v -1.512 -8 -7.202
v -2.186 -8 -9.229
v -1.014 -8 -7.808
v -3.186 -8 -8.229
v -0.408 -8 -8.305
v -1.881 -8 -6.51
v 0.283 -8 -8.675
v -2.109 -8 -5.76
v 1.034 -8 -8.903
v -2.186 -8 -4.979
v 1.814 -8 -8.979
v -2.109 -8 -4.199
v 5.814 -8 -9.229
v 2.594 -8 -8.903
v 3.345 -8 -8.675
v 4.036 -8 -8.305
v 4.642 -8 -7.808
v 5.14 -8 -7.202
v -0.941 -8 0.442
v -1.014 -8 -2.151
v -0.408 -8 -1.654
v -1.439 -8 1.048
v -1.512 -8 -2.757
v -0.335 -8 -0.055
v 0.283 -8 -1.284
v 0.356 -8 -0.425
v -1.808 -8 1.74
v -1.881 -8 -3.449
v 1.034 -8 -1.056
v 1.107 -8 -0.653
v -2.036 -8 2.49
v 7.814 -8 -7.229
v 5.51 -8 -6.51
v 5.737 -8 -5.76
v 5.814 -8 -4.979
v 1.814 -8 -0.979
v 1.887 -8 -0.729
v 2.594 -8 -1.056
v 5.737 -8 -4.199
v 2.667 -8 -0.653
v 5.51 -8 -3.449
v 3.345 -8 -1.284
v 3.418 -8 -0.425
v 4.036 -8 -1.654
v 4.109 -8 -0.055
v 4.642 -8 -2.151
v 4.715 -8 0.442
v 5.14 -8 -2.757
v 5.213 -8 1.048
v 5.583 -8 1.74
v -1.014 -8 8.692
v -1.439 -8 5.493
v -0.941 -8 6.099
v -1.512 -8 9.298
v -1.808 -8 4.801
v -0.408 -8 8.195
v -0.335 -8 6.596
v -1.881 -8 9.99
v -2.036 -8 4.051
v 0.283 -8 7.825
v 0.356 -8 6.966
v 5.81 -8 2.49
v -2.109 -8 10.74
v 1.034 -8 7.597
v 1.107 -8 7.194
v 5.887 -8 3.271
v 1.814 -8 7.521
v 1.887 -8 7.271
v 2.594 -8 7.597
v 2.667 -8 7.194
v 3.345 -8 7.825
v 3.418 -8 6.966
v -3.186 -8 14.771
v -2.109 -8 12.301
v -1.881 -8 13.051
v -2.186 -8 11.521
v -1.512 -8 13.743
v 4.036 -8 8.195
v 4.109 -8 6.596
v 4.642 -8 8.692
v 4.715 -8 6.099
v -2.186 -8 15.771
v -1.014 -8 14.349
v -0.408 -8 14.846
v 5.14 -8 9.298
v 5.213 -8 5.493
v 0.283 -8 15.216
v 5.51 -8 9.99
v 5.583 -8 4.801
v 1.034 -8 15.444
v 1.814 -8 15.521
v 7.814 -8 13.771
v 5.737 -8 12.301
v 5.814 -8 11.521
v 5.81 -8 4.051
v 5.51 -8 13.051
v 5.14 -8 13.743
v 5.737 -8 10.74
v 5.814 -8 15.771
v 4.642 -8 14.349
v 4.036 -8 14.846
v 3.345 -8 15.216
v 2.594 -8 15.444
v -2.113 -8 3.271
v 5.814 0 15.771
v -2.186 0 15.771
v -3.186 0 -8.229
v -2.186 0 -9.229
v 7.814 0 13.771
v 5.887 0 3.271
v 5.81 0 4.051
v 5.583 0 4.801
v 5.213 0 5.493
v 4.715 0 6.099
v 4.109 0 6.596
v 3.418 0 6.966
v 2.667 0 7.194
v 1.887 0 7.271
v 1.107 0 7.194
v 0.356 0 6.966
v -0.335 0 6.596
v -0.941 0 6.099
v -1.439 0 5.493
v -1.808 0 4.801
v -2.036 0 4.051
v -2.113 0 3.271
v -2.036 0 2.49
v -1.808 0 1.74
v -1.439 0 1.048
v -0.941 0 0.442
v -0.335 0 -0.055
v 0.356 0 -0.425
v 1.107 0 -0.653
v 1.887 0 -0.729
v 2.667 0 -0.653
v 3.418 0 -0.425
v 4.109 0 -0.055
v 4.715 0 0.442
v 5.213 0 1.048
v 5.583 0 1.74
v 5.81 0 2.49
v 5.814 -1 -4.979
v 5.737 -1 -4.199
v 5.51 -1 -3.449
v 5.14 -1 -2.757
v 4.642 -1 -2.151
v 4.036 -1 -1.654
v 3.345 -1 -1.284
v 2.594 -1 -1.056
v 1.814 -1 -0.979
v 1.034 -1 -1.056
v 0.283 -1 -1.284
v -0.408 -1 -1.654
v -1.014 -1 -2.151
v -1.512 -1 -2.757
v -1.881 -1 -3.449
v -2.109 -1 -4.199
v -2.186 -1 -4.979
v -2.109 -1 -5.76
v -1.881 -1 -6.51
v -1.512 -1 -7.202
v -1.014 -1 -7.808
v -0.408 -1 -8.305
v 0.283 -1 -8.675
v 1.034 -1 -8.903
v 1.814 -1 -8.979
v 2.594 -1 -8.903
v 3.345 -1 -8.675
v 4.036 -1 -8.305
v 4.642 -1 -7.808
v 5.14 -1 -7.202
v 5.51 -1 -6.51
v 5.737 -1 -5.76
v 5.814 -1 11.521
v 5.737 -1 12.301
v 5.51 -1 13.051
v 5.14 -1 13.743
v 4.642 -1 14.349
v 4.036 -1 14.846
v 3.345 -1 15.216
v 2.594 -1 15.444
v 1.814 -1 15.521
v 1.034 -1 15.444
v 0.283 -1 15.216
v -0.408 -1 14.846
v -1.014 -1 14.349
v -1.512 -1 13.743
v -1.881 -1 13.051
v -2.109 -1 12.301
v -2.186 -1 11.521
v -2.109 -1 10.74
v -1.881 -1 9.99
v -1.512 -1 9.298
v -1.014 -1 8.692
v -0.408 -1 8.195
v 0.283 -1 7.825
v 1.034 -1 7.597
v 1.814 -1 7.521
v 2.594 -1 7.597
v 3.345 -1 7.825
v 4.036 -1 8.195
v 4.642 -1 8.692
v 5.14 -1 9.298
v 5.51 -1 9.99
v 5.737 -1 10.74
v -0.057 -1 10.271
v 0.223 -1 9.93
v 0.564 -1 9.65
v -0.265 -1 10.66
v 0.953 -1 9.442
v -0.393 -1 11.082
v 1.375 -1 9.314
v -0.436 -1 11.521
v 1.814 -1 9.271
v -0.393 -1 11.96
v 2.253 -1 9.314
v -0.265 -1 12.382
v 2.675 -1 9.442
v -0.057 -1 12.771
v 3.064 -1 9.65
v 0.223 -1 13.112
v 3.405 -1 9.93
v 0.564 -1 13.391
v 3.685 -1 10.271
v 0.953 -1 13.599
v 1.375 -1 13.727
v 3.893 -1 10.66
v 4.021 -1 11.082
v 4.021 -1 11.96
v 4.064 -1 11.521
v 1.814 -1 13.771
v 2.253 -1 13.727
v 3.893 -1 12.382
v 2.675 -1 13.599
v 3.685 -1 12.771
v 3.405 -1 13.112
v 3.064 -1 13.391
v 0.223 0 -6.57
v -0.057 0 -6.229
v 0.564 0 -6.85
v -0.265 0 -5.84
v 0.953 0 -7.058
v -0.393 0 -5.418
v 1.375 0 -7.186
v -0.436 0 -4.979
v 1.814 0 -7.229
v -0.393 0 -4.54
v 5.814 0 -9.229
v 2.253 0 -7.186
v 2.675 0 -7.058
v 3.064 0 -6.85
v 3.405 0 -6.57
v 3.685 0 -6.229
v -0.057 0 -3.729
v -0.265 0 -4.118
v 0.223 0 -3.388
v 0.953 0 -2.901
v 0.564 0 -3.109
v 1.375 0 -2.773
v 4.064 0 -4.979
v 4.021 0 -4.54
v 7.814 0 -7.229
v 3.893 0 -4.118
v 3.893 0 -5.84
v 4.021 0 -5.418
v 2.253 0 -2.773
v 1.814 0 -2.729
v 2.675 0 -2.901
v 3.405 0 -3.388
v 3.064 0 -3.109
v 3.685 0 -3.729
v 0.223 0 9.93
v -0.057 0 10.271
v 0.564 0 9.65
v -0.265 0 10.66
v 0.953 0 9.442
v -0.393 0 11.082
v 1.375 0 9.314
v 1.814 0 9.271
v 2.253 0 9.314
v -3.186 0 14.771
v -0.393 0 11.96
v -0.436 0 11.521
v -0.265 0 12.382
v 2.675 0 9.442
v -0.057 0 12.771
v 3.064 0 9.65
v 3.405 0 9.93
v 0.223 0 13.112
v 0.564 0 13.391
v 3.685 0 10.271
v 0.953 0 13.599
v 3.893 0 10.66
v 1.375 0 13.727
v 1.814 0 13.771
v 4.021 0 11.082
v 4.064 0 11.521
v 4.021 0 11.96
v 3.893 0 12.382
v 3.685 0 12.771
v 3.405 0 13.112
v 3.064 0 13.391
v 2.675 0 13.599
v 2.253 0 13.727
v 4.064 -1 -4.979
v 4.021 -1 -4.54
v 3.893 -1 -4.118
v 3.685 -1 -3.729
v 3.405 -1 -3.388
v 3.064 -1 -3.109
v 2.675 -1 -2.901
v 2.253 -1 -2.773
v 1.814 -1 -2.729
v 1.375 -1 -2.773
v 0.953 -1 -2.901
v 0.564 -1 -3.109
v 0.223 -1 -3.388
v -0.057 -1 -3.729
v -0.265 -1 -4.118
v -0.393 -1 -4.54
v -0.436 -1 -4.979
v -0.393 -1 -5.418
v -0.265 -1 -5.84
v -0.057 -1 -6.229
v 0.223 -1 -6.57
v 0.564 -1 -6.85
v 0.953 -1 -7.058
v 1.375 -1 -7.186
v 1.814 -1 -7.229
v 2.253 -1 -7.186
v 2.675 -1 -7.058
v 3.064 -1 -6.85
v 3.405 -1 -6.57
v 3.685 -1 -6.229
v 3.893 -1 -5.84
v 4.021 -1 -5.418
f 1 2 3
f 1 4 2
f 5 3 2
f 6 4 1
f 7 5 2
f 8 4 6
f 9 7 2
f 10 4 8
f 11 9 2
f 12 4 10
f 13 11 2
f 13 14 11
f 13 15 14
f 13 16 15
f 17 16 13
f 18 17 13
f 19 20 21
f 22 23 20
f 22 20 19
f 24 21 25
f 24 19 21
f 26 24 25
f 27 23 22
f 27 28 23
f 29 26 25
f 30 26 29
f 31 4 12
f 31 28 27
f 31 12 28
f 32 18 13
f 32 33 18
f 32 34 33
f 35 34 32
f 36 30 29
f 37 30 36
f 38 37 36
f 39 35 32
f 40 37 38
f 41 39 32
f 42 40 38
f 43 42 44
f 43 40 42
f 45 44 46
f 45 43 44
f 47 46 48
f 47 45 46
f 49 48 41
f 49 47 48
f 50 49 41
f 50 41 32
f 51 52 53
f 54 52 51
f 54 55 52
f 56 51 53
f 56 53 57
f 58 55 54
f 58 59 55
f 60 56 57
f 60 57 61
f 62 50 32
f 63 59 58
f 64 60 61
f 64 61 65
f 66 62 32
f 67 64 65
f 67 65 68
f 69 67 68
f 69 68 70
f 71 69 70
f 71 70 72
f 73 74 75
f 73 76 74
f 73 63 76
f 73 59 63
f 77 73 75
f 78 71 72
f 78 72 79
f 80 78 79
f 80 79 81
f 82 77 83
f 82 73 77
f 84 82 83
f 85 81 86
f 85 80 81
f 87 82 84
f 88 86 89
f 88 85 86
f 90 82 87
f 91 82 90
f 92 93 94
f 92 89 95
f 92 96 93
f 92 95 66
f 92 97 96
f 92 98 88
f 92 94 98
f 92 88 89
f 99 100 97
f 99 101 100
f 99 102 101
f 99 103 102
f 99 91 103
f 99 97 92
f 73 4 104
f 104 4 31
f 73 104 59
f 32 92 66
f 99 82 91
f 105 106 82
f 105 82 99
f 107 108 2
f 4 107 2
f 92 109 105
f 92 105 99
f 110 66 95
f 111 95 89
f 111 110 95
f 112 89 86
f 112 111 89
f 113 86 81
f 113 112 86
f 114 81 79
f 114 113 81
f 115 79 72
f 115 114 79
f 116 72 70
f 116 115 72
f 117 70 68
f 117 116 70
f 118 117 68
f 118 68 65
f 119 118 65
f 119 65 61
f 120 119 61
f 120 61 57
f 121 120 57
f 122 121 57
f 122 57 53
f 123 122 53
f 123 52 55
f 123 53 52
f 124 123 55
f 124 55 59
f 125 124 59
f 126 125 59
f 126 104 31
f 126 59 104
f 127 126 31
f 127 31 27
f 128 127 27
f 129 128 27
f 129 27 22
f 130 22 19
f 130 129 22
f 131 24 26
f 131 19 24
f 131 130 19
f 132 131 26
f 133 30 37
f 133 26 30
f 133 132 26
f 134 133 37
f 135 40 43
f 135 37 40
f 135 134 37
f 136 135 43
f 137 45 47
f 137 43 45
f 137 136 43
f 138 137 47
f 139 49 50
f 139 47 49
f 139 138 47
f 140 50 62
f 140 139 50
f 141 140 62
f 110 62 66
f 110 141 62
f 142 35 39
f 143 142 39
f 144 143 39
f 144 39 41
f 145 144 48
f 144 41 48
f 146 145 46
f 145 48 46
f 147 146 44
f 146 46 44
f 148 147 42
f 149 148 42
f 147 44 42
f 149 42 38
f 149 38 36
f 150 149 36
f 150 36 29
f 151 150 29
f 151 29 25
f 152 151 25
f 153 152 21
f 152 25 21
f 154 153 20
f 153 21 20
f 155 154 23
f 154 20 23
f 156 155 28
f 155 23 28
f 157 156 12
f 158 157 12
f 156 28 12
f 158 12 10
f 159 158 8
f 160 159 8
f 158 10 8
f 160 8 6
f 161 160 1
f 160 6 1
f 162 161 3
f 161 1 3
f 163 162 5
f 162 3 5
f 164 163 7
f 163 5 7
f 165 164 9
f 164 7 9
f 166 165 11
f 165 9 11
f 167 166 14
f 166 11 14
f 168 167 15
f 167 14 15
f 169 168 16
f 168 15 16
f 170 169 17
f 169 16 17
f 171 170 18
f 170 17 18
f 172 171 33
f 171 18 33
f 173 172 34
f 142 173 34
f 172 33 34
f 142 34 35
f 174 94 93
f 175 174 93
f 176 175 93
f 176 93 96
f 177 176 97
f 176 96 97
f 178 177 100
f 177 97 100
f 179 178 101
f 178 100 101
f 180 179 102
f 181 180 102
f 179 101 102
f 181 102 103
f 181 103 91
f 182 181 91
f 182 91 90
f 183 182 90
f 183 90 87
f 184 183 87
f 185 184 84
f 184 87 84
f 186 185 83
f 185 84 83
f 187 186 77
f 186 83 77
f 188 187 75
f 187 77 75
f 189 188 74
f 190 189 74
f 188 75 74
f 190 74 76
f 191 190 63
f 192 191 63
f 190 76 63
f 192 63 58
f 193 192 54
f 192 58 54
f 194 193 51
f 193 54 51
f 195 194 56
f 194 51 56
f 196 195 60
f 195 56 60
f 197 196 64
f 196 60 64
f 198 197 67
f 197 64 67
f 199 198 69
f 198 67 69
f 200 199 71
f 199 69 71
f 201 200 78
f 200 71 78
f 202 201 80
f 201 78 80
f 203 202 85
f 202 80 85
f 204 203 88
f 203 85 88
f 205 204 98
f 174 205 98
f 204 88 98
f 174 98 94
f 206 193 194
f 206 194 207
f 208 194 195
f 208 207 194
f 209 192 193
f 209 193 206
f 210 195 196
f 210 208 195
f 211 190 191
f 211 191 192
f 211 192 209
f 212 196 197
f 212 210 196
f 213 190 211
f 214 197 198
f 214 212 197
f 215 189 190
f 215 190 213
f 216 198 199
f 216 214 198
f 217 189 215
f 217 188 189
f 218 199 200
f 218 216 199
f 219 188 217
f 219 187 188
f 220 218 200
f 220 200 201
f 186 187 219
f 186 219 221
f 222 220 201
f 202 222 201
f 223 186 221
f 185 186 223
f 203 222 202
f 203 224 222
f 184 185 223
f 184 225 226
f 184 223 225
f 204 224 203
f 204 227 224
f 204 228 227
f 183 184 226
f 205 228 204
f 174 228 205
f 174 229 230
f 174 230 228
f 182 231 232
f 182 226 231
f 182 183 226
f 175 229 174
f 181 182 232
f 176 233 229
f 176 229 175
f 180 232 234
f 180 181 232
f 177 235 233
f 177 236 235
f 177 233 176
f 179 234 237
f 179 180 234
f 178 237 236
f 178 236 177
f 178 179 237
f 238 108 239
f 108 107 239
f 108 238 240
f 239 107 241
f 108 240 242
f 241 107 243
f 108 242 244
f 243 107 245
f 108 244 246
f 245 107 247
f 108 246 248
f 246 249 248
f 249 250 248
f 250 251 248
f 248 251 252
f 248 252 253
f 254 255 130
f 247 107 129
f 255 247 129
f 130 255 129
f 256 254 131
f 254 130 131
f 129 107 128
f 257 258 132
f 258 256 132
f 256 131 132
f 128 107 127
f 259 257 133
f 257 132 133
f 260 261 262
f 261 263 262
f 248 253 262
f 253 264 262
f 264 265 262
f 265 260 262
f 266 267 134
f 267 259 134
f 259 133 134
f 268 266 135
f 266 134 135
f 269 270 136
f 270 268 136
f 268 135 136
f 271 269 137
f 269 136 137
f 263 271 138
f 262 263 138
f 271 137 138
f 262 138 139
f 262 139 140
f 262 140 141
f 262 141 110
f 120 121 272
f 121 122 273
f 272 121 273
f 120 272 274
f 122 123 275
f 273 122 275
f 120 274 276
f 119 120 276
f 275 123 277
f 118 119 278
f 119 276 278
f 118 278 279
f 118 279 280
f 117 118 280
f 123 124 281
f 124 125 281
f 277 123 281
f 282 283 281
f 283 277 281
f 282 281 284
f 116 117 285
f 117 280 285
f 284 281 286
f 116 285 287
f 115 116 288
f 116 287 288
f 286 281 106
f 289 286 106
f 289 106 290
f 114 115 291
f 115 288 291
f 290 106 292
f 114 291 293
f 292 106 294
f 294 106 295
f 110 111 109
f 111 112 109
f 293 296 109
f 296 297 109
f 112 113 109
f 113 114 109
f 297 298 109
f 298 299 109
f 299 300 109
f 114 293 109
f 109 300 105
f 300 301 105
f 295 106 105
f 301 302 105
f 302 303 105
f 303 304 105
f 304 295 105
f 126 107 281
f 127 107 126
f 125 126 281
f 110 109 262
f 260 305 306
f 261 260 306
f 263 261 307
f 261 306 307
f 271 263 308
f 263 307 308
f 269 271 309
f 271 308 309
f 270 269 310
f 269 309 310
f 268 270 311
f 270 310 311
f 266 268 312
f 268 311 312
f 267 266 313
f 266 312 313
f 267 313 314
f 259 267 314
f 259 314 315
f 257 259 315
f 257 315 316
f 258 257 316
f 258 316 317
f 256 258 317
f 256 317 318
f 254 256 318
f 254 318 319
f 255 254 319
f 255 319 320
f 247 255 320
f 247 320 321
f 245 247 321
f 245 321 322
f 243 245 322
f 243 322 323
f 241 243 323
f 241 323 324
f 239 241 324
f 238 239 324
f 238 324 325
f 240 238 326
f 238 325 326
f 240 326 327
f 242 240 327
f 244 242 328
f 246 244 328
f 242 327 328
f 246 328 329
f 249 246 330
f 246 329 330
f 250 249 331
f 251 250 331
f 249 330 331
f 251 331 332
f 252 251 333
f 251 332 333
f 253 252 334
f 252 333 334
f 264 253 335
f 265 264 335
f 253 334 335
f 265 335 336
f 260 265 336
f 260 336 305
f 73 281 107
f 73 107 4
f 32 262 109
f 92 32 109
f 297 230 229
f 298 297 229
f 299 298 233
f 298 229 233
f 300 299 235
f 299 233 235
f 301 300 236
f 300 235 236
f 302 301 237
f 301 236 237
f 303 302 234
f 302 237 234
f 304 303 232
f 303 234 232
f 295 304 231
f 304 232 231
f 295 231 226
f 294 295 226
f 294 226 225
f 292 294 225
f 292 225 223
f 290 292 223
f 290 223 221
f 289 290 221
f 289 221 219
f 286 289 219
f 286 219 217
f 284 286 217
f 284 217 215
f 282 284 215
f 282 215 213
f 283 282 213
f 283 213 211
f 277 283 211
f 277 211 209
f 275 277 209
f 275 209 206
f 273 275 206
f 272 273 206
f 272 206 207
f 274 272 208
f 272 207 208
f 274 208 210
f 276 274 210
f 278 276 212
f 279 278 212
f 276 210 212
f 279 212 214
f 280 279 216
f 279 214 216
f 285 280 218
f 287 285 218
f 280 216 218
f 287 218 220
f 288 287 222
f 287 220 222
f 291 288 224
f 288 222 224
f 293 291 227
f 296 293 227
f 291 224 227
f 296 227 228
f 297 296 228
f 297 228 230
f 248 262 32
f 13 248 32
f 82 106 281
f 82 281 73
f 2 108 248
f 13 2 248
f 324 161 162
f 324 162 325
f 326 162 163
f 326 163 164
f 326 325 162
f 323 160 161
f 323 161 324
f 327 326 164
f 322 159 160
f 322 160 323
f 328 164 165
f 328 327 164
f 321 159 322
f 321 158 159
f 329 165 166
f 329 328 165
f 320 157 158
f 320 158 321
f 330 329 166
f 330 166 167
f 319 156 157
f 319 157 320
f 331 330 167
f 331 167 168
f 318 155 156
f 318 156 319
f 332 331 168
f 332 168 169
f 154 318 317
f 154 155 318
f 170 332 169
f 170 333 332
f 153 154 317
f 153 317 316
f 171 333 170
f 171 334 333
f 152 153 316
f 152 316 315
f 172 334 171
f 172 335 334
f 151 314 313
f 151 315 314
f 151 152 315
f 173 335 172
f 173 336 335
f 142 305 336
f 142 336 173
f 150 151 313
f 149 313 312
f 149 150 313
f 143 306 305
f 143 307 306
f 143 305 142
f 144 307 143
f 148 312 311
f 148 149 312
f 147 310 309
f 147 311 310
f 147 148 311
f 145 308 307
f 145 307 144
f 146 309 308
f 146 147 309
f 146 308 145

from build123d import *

# Parameters (mm, degrees)
F0_W      = 12
F0_H      = 25
F1_DEPTH  = 8
F2_SIZE   = 2
F3_SIZE   = 2
F4_R      = 2.25
F5_DEPTH  = 25
F6_R      = 4
F7_DEPTH  = 7
F8_R      = 4
F9_DEPTH  = 25
F10_W     = 8
F10_H     = 27.262656
F11_DEPTH = 1


with BuildPart() as f1:
    # F0 (on Front) → F1 (new body)
    with BuildSketch(Plane.XZ):
        with Locations((1.81407, 3.270565)):
            Rectangle(F0_W, F0_H)
    extrude(amount=F1_DEPTH)

    # F2
    f2_edges = [f1.edges().sort_by_distance(p)[0] for p in [
        (-4.18593, -4, 15.770565),
    ]]
    chamfer(f2_edges, length=F2_SIZE)

    # F3
    f3_edges = [f1.edges().sort_by_distance(p)[0] for p in [
        (7.81407, -4, 15.770565),
        (7.81407, -4, -9.229435),
        (-4.18593, -4, -9.229435),
    ]]
    chamfer(f3_edges, length=F3_SIZE)

    # F4 (on face) → F5 (cut)
    with BuildSketch(Plane.XZ.offset(8)):
        with Locations((1.81407, -4.979435)):
            Circle(F4_R)
        with Locations((1.81407, 11.520565)):
            Circle(F4_R)
    extrude(amount=-F5_DEPTH, mode=Mode.SUBTRACT)

    # F6 (on face) → F7 (cut)
    with BuildSketch(Plane.XZ.offset(8)):
        with Locations((1.81407, 11.520565)):
            Circle(F6_R)
        with Locations((1.81407, -4.979435)):
            Circle(F6_R)
    extrude(amount=-F7_DEPTH, mode=Mode.SUBTRACT)

    # F8 (on Front) → F9 (cut)
    with BuildSketch(Plane.XZ):
        with Locations((1.887019, 3.270565)):
            Circle(F8_R)
    extrude(amount=F9_DEPTH, mode=Mode.SUBTRACT)

    # F10 (on face) → F11 (cut)
    with BuildSketch(Plane(origin=(-4.18593, 0, 0), x_dir=(0, -1, 0), z_dir=(-1, 0, 0))):
        with Locations((4, 2.890538)):
            Rectangle(F10_W, F10_H)
    extrude(amount=-F11_DEPTH, mode=Mode.SUBTRACT)


solid = f1.part
